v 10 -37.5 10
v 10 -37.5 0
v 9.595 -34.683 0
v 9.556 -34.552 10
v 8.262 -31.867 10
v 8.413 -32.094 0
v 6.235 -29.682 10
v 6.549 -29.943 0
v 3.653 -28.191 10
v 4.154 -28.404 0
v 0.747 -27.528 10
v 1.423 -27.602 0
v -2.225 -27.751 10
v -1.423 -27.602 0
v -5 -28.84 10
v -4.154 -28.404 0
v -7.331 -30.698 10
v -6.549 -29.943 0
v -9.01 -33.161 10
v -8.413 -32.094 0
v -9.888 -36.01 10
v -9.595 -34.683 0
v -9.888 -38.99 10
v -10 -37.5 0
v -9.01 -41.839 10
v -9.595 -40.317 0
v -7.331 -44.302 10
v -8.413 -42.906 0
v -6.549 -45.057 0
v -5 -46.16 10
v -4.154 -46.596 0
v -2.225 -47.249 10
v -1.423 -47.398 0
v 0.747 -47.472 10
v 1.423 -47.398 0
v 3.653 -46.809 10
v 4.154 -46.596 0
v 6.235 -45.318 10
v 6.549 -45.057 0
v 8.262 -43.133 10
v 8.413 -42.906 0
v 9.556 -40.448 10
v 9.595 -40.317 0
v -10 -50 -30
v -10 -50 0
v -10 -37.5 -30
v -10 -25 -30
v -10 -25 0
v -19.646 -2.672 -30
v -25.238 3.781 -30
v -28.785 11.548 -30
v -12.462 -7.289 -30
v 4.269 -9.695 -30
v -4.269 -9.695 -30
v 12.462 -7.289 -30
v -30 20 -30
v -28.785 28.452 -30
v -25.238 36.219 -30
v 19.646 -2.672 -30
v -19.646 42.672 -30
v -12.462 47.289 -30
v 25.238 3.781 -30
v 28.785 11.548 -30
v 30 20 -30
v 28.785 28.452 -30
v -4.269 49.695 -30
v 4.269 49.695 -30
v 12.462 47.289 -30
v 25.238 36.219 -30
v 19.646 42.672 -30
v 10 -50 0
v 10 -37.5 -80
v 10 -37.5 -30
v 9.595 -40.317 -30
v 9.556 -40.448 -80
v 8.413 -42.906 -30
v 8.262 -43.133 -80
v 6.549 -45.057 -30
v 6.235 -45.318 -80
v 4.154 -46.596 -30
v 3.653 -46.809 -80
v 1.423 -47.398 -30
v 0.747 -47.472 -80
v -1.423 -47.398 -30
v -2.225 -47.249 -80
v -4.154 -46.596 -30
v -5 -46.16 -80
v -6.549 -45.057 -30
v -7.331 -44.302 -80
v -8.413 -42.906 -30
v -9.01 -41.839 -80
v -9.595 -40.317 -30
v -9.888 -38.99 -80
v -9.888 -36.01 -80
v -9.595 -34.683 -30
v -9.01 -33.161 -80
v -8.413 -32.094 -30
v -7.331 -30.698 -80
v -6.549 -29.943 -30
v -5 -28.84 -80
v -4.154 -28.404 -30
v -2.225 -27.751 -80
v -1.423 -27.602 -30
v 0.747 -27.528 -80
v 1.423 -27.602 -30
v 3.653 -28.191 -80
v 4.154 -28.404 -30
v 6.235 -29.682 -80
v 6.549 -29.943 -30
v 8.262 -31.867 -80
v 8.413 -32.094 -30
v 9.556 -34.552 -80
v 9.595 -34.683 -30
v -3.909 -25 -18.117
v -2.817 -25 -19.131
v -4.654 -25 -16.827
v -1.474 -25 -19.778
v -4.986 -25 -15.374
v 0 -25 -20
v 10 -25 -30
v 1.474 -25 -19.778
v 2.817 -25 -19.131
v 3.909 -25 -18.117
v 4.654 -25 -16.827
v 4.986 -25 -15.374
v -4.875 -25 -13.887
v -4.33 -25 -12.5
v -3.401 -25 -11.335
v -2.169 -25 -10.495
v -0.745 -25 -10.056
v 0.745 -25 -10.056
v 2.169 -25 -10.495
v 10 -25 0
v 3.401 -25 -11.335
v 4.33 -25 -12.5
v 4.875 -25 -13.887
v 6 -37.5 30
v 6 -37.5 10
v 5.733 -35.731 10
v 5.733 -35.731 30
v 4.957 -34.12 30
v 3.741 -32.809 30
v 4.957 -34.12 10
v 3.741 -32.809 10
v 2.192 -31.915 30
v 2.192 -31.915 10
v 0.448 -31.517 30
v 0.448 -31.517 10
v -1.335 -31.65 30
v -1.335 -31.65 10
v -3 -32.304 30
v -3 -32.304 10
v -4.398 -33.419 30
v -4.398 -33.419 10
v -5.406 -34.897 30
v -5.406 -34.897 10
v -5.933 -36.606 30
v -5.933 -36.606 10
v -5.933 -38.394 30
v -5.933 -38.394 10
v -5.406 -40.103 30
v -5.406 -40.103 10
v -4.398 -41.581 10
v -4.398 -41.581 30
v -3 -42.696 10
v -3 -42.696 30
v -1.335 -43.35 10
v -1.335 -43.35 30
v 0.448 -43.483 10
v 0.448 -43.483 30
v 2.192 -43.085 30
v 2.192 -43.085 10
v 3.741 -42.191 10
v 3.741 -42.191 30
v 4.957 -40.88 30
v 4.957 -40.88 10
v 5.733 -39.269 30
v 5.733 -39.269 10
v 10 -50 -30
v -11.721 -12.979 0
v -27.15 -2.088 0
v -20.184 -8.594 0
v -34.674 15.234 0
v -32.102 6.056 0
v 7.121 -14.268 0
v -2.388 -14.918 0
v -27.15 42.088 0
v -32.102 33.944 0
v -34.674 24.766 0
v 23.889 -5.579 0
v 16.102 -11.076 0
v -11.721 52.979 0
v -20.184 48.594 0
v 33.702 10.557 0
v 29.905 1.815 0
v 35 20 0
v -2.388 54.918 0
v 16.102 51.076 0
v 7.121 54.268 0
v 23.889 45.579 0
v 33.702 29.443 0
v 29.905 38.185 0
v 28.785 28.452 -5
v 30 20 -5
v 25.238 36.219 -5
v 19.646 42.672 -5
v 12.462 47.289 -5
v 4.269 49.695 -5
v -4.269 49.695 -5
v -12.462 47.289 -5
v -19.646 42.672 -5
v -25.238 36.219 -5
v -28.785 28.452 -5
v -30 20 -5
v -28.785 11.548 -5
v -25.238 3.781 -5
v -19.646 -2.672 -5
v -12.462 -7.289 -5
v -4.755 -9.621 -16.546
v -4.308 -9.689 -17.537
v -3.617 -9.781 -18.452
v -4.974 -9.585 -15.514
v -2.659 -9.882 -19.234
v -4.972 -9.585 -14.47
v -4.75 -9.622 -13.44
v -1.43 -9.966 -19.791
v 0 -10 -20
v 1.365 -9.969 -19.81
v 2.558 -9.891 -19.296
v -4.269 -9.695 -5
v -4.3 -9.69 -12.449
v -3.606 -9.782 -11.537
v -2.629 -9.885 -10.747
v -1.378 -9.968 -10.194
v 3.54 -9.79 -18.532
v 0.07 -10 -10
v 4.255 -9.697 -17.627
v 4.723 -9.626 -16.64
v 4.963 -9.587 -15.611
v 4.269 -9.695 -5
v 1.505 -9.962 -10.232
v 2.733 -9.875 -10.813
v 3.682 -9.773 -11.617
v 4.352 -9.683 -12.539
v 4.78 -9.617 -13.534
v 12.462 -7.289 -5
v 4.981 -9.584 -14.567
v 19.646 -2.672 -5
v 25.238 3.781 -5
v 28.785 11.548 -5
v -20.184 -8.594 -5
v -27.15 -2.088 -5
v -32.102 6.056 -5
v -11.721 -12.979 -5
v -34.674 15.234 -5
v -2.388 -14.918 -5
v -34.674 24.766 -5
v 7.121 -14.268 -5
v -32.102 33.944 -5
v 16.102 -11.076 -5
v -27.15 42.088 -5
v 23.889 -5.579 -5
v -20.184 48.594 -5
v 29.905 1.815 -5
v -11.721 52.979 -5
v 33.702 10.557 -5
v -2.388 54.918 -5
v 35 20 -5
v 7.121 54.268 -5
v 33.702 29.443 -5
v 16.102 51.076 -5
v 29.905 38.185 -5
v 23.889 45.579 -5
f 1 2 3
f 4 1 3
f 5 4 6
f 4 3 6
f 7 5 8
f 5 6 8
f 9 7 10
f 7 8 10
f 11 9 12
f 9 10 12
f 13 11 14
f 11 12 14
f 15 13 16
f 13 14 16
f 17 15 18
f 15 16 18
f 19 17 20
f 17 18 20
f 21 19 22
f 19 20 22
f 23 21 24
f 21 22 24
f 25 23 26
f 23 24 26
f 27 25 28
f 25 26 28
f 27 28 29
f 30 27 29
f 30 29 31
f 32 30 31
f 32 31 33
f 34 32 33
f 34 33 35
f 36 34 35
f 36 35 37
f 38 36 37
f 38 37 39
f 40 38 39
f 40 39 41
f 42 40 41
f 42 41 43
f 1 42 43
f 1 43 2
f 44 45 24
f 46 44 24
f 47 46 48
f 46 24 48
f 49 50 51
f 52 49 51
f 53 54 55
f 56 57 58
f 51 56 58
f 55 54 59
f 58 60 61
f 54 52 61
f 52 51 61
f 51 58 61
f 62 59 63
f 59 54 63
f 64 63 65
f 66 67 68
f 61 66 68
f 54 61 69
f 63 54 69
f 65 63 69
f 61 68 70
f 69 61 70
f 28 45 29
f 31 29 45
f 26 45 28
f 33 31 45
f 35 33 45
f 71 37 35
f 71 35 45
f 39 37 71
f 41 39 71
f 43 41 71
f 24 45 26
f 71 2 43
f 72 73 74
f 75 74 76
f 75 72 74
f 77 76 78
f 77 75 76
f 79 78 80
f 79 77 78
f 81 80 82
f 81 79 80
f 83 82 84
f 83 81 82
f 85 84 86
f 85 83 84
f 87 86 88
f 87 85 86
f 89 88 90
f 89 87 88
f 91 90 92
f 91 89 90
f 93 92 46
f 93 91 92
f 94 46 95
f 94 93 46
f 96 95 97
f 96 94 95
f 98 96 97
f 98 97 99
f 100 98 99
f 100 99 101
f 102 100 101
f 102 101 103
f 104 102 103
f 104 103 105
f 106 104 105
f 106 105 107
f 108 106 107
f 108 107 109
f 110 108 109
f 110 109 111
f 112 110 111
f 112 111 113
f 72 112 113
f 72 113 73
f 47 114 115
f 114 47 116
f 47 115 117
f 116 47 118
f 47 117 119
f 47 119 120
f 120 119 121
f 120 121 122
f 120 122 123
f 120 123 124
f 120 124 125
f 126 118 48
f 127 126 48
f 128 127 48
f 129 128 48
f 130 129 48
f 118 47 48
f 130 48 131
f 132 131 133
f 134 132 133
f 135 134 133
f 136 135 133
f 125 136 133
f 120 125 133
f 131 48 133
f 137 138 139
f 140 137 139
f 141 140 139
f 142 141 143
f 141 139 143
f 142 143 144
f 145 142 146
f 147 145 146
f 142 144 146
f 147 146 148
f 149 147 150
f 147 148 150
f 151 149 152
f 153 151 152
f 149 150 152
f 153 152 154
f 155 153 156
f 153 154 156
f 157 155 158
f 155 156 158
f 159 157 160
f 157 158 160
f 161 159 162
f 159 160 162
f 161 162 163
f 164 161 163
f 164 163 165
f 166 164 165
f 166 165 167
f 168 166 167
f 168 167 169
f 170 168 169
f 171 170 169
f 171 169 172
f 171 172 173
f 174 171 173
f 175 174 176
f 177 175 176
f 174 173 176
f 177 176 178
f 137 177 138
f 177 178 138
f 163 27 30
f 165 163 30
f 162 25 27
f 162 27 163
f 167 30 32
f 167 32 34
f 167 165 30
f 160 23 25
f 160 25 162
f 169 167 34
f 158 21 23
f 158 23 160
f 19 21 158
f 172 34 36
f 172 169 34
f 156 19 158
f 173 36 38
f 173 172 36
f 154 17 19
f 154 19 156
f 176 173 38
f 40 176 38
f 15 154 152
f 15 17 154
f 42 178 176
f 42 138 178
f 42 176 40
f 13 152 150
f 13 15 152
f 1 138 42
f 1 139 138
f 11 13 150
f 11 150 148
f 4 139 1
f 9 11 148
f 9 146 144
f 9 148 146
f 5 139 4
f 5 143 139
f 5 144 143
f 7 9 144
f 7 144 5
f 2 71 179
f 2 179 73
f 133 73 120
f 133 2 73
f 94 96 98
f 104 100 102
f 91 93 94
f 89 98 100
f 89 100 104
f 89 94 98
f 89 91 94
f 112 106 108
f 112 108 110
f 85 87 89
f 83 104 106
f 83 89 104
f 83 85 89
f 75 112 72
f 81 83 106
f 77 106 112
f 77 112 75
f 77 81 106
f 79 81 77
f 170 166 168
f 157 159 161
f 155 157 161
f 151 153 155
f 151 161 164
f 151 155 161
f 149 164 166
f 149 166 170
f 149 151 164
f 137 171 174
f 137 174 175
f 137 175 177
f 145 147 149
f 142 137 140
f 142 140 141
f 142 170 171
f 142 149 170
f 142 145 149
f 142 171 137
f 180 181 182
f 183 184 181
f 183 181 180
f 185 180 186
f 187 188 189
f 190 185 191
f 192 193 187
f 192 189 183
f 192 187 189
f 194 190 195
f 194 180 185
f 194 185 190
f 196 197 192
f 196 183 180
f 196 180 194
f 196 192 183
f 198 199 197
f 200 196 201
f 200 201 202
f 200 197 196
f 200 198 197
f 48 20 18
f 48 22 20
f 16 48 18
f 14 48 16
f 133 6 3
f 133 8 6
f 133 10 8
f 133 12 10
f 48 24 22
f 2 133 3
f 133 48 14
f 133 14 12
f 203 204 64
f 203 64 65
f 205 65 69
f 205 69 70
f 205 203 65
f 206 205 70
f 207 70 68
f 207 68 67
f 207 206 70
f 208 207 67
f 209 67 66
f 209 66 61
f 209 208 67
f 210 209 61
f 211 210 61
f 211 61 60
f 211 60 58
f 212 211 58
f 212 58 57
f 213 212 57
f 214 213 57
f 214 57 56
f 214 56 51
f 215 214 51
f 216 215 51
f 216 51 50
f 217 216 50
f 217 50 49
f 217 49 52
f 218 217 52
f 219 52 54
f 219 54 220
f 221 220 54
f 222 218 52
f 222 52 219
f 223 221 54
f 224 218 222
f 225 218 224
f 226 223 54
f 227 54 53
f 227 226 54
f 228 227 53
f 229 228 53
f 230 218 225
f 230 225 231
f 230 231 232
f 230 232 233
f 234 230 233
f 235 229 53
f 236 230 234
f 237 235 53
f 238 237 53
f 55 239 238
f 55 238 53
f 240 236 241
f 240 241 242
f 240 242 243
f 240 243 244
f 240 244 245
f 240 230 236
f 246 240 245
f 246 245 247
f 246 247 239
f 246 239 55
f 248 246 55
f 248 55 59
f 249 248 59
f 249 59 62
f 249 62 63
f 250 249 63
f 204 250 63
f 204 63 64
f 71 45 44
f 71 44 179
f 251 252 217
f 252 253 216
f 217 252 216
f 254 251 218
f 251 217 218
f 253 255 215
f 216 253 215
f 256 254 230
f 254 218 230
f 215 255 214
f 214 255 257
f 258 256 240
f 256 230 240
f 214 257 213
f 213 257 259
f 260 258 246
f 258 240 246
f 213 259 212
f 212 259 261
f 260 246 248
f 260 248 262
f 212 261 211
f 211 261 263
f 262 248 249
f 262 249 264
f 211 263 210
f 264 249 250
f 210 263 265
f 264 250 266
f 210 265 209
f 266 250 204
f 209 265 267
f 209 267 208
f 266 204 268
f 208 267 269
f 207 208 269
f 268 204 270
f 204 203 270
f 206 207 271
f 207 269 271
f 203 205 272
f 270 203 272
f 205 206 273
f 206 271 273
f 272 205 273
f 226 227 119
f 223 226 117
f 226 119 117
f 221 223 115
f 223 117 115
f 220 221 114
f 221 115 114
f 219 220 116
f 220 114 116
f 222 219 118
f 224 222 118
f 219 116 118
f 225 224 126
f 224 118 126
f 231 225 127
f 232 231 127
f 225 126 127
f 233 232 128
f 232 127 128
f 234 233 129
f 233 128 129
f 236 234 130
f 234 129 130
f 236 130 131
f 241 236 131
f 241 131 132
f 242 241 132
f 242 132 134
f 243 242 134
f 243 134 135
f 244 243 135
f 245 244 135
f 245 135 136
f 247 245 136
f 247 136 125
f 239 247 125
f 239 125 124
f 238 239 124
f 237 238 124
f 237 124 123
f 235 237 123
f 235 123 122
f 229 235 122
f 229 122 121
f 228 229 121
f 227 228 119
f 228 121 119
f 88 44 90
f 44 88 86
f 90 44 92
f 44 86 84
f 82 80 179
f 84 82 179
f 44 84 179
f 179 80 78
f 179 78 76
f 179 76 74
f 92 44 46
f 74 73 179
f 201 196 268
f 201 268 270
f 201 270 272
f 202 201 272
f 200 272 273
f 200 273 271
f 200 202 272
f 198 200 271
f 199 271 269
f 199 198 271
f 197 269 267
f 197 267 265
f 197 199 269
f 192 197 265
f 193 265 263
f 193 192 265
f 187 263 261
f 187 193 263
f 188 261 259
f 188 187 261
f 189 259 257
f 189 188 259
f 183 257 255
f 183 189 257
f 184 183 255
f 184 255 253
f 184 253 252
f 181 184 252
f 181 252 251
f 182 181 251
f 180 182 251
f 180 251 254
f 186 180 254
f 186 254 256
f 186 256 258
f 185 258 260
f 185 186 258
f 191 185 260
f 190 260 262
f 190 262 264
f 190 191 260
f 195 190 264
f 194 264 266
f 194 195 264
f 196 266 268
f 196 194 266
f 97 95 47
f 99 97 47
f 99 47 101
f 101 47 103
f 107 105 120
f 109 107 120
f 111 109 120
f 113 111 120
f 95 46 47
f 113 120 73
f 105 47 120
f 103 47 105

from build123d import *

# Parameters (mm, degrees)
CROQUIS1_R                   = 30
SALIENTE_EXTRUIR1_DEPTH      = 30
CROQUIS1_W                   = 20
CROQUIS1_H                   = 25
SALIENTE_EXTRUIR1_2_DEPTH    = 30
CROQUIS2_R                   = 35
CROQUIS2_R_2                 = 30
SALIENTE_EXTRUIR2_DEPTH      = 5
SALIENTE_EXTRUIR3_REACH      = 94.331
SALIENTE_EXTRUIR3_END_RADIUS = 30
CROQUIS3_R                   = 5
CROQUIS4_R                   = 10
SALIENTE_EXTRUIR4_DEPTH      = 10
CROQUIS5_R                   = 6
SALIENTE_EXTRUIR5_DEPTH      = 20
SALIENTE_EXTRUIR6_START      = 50
CROQUIS6_R                   = 10
SALIENTE_EXTRUIR6_DEPTH      = 50


with BuildPart() as part:
    # Croquis1 → Saliente-Extruir1 (new body)
    with BuildSketch(Plane.XY):
        with Locations((0, 20)):
            Circle(CROQUIS1_R)
    extrude(amount=-SALIENTE_EXTRUIR1_DEPTH)

    # Croquis2 → Saliente-Extruir2 (add)
    with BuildSketch(Plane.XY):
        with Locations((0, 20)):
            Circle(CROQUIS2_R)
        with Locations((0, 20)):
            Circle(CROQUIS2_R_2, mode=Mode.SUBTRACT)
    extrude(amount=-SALIENTE_EXTRUIR2_DEPTH)



with BuildPart() as body_2:
    # Croquis1 → Saliente-Extruir1 2 (new body)
    with BuildSketch(Plane.XY):
        with Locations((0, -37.5)):
            Rectangle(CROQUIS1_W, CROQUIS1_H)
    extrude(amount=-SALIENTE_EXTRUIR1_2_DEPTH)


with BuildPart() as part_1:
    add(part.part)

    add(body_2.part)  # Saliente-Extruir3 merges body 2
    # Saliente-Extruir3: up to this cylinder (the profile starts outside it)
    saliente_extruir3_end = Plane(origin=(0, 20, -15), z_dir=(0, 0, 1)) * Cylinder(SALIENTE_EXTRUIR3_END_RADIUS, 249.662, mode=Mode.PRIVATE)
    # Croquis3 → Saliente-Extruir3 (add, up to the surface)
    with BuildSketch(Plane(origin=(0, -25, 0), x_dir=(1, 0, 0), z_dir=(0, 1, 0)), mode=Mode.PRIVATE) as saliente_extruir3_sk1:
        with Locations(Location((0, 15, 0), (0, 0, 90))):
            Circle(CROQUIS3_R)
    saliente_extruir3_tool1 = extrude(saliente_extruir3_sk1.sketch, amount=SALIENTE_EXTRUIR3_REACH, mode=Mode.PRIVATE) - saliente_extruir3_end
    add(saliente_extruir3_tool1.solids().sort_by_distance((0, -25, -15))[0])

    # Croquis4 → Saliente-Extruir4 (add)
    with BuildSketch(Plane.XY):
        with Locations((0, -37.5)):
            Circle(CROQUIS4_R)
    extrude(amount=SALIENTE_EXTRUIR4_DEPTH)

    # Croquis5 → Saliente-Extruir5 (add)
    with BuildSketch(Plane.XY.offset(10)):
        with Locations((0, -37.5)):
            Circle(CROQUIS5_R)
    extrude(amount=SALIENTE_EXTRUIR5_DEPTH)

    # Croquis6 → Saliente-Extruir6 (add)
    with BuildSketch(Plane(origin=(0, 0, -30), x_dir=(-1, 0, 0), z_dir=(0, 0, -1)).offset(SALIENTE_EXTRUIR6_START)):
        with Locations(Location((0, -37.5, 0), (0, 0, 180))):
            Circle(CROQUIS6_R)
    extrude(amount=-SALIENTE_EXTRUIR6_DEPTH)


solid = part_1.part
